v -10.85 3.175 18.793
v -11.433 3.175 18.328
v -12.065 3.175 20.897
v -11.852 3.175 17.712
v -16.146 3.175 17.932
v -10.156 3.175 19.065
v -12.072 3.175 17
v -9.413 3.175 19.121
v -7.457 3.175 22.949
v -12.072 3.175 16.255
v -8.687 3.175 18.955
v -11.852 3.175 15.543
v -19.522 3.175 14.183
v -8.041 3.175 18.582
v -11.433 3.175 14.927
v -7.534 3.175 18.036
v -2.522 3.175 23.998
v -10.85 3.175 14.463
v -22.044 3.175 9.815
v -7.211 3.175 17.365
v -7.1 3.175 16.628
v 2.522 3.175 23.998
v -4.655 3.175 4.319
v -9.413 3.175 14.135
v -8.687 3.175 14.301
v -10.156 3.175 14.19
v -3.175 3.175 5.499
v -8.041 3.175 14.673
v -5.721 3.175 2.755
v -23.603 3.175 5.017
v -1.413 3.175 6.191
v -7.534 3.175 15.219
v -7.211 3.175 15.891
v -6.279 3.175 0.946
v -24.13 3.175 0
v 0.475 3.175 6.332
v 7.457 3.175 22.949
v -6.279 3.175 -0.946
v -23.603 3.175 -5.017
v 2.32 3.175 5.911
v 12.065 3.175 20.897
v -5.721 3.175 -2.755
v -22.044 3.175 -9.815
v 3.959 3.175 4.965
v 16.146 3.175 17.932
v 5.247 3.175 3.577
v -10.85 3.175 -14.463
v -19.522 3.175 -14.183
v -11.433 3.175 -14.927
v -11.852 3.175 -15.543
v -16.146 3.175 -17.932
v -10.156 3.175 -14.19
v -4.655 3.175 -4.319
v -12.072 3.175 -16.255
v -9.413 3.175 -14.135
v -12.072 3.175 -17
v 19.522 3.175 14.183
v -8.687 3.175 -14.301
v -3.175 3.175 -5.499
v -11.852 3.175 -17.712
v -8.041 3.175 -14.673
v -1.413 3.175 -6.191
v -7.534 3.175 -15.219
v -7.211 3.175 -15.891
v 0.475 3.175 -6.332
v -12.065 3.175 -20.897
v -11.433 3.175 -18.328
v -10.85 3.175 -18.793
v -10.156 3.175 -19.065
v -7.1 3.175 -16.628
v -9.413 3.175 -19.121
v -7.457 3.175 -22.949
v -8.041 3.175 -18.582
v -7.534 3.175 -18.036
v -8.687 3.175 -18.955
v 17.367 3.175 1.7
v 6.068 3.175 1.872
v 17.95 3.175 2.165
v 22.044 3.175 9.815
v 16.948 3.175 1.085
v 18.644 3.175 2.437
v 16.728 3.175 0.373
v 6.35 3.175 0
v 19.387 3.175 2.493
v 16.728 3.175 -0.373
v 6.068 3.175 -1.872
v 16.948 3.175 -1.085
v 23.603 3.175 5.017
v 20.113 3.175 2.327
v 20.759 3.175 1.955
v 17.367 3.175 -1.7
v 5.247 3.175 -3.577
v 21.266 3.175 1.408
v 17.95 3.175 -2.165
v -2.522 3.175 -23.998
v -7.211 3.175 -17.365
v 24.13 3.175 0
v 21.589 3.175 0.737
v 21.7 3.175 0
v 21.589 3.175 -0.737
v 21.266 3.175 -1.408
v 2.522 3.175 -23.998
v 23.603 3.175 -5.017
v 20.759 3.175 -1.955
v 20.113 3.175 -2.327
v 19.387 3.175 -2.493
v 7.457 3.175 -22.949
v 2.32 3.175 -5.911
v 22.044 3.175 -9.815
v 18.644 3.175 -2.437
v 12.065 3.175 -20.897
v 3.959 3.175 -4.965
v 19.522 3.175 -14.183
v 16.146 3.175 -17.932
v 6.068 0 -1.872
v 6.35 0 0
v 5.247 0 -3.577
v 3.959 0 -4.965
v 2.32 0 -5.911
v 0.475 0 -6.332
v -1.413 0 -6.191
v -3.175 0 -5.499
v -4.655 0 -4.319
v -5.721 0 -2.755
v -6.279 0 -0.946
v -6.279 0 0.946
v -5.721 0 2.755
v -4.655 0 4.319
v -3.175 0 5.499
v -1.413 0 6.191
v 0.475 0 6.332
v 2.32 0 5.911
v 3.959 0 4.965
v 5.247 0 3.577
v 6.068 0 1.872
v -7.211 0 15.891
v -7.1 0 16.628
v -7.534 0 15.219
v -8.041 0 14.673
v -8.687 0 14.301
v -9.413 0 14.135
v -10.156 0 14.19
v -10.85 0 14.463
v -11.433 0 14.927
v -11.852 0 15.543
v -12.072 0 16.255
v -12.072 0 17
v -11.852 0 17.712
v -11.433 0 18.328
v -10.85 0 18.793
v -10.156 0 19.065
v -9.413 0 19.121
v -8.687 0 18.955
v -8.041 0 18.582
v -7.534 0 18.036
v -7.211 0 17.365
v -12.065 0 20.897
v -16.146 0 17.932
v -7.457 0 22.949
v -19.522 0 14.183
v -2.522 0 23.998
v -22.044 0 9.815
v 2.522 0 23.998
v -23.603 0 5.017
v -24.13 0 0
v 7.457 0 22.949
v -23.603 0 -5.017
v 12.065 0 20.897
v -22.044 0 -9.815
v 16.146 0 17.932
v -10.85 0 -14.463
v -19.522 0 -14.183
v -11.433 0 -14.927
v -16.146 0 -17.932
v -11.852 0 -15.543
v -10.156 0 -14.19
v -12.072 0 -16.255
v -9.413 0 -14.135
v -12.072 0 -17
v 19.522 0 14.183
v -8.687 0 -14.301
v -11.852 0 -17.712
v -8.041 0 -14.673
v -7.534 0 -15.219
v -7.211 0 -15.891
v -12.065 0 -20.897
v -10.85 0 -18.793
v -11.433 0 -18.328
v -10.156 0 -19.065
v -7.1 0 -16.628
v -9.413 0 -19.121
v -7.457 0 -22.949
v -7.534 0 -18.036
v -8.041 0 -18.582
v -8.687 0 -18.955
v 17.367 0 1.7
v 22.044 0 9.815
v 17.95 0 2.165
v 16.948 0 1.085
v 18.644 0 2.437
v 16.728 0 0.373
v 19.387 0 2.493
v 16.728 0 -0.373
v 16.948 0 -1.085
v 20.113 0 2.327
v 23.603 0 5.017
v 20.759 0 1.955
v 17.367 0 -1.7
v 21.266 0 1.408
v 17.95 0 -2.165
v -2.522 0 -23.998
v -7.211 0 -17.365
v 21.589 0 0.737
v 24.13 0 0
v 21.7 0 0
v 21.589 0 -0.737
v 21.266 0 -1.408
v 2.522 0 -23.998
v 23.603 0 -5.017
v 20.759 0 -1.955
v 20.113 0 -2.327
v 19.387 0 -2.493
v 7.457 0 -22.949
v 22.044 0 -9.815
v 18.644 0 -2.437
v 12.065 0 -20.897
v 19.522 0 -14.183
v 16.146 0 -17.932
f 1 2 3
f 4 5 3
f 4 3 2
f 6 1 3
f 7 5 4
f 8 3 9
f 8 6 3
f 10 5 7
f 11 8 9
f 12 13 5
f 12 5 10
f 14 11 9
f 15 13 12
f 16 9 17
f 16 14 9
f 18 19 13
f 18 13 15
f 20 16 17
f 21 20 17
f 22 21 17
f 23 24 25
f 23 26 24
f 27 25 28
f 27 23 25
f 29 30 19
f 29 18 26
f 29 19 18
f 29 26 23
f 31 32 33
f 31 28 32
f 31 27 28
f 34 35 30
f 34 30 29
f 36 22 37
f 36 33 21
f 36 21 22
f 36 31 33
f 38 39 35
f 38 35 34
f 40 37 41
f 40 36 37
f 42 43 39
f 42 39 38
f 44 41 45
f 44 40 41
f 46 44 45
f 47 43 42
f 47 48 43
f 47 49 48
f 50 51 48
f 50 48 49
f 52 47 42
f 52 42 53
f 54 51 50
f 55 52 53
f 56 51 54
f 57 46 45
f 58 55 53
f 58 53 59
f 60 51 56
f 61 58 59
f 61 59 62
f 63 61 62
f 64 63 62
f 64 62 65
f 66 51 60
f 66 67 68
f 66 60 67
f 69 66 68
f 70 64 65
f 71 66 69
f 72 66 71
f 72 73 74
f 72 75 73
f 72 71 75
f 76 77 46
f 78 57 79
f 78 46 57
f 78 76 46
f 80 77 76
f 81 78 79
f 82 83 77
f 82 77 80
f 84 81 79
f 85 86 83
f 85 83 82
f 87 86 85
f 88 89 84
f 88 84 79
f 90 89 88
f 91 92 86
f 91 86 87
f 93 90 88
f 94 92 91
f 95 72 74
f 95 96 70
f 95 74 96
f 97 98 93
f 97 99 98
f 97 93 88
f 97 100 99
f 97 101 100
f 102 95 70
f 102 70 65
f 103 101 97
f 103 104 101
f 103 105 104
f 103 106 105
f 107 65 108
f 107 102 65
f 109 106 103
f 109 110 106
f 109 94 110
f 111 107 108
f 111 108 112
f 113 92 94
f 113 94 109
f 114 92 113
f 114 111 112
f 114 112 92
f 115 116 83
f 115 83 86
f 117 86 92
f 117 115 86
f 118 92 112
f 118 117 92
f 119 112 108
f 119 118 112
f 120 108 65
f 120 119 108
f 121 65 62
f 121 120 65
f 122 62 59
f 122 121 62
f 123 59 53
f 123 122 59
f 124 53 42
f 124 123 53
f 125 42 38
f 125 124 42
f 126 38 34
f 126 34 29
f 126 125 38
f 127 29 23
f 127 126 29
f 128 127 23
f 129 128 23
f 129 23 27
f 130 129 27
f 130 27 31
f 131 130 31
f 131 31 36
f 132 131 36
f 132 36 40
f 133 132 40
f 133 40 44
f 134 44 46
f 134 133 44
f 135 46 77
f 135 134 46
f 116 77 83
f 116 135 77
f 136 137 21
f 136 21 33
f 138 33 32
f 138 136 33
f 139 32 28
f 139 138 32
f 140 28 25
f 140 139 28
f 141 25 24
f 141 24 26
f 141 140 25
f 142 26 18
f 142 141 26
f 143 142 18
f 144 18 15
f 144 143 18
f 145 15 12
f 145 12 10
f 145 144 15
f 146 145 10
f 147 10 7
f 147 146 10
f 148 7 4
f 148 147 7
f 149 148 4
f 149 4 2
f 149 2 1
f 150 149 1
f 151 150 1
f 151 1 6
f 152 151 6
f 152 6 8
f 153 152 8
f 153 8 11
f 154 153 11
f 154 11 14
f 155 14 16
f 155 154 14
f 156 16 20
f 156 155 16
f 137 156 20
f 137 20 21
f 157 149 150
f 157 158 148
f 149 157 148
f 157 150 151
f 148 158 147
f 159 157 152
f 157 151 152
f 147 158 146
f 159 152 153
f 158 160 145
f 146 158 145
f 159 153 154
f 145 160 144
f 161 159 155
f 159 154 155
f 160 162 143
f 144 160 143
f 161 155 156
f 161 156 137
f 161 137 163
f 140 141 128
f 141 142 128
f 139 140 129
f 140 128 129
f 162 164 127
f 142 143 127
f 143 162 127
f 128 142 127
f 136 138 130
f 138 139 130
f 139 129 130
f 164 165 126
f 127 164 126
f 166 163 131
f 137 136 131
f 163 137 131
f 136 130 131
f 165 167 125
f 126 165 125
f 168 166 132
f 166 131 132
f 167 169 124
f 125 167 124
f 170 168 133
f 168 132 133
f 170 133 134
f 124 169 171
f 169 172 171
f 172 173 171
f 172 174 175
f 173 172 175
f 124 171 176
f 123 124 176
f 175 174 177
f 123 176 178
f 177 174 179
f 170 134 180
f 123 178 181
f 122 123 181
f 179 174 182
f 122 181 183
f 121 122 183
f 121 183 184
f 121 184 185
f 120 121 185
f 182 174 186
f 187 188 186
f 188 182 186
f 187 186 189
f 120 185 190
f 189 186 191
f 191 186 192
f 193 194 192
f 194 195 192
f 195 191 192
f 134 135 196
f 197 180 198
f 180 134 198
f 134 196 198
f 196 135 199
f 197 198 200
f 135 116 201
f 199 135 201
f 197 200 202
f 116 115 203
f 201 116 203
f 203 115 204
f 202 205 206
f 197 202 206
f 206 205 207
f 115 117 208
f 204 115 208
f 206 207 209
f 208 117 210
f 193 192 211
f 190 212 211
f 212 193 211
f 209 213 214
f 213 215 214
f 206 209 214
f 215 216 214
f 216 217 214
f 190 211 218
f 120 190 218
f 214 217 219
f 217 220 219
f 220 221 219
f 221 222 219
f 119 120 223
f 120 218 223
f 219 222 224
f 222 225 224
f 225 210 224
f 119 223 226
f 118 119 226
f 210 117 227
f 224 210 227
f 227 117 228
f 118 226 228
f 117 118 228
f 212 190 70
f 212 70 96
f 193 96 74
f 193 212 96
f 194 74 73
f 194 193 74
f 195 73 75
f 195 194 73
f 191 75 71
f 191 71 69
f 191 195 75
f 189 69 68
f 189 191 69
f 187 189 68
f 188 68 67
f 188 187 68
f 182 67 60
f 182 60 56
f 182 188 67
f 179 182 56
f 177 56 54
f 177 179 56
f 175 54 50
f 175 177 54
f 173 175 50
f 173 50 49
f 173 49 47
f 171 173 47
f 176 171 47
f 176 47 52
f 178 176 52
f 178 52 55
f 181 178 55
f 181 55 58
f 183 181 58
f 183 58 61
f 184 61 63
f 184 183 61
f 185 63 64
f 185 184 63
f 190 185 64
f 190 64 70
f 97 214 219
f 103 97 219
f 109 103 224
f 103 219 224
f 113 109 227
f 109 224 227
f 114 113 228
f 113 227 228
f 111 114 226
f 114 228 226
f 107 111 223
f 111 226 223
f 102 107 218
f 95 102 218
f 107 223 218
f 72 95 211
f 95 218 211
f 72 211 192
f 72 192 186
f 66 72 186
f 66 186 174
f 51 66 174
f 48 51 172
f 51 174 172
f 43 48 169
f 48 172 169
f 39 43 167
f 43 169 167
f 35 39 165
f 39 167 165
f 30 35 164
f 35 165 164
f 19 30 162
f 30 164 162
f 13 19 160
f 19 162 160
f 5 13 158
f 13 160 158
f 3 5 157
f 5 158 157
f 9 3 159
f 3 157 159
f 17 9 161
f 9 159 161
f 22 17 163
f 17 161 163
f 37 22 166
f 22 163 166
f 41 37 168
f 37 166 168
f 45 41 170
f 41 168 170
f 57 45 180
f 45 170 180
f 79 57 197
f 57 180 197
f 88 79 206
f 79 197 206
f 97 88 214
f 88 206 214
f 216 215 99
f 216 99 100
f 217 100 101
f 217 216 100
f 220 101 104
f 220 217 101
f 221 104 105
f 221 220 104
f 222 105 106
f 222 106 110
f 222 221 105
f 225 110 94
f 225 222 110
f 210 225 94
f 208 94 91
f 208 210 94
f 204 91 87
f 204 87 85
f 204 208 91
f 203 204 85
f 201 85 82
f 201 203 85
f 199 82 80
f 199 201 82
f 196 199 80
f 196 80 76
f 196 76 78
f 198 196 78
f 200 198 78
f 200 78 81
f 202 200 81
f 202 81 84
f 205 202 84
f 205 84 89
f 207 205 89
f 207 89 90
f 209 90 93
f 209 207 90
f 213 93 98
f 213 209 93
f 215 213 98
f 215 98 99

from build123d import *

# Parameters (mm, degrees)
SKETCH1_R           = 24.13
SKETCH1_R_2         = 2.5
SKETCH1_R_3         = 6.35
BOSS_EXTRUDE1_DEPTH = 3.175


with BuildPart() as part:
    # Sketch1 → Boss-Extrude1 (new body)
    with BuildSketch(Plane(origin=(0, 0, 0), x_dir=(1, 0, 0), z_dir=(0, 1, 0))):
        Circle(SKETCH1_R)
        with Locations((19.2, 0)):
            Circle(SKETCH1_R_2, mode=Mode.SUBTRACT)
        with Locations((-9.6, 16.627687753)):
            Circle(SKETCH1_R_2, mode=Mode.SUBTRACT)
        with Locations((-9.6, -16.627687753)):
            Circle(SKETCH1_R_2, mode=Mode.SUBTRACT)
        Circle(SKETCH1_R_3, mode=Mode.SUBTRACT)
    extrude(amount=BOSS_EXTRUDE1_DEPTH)


solid = part.part
